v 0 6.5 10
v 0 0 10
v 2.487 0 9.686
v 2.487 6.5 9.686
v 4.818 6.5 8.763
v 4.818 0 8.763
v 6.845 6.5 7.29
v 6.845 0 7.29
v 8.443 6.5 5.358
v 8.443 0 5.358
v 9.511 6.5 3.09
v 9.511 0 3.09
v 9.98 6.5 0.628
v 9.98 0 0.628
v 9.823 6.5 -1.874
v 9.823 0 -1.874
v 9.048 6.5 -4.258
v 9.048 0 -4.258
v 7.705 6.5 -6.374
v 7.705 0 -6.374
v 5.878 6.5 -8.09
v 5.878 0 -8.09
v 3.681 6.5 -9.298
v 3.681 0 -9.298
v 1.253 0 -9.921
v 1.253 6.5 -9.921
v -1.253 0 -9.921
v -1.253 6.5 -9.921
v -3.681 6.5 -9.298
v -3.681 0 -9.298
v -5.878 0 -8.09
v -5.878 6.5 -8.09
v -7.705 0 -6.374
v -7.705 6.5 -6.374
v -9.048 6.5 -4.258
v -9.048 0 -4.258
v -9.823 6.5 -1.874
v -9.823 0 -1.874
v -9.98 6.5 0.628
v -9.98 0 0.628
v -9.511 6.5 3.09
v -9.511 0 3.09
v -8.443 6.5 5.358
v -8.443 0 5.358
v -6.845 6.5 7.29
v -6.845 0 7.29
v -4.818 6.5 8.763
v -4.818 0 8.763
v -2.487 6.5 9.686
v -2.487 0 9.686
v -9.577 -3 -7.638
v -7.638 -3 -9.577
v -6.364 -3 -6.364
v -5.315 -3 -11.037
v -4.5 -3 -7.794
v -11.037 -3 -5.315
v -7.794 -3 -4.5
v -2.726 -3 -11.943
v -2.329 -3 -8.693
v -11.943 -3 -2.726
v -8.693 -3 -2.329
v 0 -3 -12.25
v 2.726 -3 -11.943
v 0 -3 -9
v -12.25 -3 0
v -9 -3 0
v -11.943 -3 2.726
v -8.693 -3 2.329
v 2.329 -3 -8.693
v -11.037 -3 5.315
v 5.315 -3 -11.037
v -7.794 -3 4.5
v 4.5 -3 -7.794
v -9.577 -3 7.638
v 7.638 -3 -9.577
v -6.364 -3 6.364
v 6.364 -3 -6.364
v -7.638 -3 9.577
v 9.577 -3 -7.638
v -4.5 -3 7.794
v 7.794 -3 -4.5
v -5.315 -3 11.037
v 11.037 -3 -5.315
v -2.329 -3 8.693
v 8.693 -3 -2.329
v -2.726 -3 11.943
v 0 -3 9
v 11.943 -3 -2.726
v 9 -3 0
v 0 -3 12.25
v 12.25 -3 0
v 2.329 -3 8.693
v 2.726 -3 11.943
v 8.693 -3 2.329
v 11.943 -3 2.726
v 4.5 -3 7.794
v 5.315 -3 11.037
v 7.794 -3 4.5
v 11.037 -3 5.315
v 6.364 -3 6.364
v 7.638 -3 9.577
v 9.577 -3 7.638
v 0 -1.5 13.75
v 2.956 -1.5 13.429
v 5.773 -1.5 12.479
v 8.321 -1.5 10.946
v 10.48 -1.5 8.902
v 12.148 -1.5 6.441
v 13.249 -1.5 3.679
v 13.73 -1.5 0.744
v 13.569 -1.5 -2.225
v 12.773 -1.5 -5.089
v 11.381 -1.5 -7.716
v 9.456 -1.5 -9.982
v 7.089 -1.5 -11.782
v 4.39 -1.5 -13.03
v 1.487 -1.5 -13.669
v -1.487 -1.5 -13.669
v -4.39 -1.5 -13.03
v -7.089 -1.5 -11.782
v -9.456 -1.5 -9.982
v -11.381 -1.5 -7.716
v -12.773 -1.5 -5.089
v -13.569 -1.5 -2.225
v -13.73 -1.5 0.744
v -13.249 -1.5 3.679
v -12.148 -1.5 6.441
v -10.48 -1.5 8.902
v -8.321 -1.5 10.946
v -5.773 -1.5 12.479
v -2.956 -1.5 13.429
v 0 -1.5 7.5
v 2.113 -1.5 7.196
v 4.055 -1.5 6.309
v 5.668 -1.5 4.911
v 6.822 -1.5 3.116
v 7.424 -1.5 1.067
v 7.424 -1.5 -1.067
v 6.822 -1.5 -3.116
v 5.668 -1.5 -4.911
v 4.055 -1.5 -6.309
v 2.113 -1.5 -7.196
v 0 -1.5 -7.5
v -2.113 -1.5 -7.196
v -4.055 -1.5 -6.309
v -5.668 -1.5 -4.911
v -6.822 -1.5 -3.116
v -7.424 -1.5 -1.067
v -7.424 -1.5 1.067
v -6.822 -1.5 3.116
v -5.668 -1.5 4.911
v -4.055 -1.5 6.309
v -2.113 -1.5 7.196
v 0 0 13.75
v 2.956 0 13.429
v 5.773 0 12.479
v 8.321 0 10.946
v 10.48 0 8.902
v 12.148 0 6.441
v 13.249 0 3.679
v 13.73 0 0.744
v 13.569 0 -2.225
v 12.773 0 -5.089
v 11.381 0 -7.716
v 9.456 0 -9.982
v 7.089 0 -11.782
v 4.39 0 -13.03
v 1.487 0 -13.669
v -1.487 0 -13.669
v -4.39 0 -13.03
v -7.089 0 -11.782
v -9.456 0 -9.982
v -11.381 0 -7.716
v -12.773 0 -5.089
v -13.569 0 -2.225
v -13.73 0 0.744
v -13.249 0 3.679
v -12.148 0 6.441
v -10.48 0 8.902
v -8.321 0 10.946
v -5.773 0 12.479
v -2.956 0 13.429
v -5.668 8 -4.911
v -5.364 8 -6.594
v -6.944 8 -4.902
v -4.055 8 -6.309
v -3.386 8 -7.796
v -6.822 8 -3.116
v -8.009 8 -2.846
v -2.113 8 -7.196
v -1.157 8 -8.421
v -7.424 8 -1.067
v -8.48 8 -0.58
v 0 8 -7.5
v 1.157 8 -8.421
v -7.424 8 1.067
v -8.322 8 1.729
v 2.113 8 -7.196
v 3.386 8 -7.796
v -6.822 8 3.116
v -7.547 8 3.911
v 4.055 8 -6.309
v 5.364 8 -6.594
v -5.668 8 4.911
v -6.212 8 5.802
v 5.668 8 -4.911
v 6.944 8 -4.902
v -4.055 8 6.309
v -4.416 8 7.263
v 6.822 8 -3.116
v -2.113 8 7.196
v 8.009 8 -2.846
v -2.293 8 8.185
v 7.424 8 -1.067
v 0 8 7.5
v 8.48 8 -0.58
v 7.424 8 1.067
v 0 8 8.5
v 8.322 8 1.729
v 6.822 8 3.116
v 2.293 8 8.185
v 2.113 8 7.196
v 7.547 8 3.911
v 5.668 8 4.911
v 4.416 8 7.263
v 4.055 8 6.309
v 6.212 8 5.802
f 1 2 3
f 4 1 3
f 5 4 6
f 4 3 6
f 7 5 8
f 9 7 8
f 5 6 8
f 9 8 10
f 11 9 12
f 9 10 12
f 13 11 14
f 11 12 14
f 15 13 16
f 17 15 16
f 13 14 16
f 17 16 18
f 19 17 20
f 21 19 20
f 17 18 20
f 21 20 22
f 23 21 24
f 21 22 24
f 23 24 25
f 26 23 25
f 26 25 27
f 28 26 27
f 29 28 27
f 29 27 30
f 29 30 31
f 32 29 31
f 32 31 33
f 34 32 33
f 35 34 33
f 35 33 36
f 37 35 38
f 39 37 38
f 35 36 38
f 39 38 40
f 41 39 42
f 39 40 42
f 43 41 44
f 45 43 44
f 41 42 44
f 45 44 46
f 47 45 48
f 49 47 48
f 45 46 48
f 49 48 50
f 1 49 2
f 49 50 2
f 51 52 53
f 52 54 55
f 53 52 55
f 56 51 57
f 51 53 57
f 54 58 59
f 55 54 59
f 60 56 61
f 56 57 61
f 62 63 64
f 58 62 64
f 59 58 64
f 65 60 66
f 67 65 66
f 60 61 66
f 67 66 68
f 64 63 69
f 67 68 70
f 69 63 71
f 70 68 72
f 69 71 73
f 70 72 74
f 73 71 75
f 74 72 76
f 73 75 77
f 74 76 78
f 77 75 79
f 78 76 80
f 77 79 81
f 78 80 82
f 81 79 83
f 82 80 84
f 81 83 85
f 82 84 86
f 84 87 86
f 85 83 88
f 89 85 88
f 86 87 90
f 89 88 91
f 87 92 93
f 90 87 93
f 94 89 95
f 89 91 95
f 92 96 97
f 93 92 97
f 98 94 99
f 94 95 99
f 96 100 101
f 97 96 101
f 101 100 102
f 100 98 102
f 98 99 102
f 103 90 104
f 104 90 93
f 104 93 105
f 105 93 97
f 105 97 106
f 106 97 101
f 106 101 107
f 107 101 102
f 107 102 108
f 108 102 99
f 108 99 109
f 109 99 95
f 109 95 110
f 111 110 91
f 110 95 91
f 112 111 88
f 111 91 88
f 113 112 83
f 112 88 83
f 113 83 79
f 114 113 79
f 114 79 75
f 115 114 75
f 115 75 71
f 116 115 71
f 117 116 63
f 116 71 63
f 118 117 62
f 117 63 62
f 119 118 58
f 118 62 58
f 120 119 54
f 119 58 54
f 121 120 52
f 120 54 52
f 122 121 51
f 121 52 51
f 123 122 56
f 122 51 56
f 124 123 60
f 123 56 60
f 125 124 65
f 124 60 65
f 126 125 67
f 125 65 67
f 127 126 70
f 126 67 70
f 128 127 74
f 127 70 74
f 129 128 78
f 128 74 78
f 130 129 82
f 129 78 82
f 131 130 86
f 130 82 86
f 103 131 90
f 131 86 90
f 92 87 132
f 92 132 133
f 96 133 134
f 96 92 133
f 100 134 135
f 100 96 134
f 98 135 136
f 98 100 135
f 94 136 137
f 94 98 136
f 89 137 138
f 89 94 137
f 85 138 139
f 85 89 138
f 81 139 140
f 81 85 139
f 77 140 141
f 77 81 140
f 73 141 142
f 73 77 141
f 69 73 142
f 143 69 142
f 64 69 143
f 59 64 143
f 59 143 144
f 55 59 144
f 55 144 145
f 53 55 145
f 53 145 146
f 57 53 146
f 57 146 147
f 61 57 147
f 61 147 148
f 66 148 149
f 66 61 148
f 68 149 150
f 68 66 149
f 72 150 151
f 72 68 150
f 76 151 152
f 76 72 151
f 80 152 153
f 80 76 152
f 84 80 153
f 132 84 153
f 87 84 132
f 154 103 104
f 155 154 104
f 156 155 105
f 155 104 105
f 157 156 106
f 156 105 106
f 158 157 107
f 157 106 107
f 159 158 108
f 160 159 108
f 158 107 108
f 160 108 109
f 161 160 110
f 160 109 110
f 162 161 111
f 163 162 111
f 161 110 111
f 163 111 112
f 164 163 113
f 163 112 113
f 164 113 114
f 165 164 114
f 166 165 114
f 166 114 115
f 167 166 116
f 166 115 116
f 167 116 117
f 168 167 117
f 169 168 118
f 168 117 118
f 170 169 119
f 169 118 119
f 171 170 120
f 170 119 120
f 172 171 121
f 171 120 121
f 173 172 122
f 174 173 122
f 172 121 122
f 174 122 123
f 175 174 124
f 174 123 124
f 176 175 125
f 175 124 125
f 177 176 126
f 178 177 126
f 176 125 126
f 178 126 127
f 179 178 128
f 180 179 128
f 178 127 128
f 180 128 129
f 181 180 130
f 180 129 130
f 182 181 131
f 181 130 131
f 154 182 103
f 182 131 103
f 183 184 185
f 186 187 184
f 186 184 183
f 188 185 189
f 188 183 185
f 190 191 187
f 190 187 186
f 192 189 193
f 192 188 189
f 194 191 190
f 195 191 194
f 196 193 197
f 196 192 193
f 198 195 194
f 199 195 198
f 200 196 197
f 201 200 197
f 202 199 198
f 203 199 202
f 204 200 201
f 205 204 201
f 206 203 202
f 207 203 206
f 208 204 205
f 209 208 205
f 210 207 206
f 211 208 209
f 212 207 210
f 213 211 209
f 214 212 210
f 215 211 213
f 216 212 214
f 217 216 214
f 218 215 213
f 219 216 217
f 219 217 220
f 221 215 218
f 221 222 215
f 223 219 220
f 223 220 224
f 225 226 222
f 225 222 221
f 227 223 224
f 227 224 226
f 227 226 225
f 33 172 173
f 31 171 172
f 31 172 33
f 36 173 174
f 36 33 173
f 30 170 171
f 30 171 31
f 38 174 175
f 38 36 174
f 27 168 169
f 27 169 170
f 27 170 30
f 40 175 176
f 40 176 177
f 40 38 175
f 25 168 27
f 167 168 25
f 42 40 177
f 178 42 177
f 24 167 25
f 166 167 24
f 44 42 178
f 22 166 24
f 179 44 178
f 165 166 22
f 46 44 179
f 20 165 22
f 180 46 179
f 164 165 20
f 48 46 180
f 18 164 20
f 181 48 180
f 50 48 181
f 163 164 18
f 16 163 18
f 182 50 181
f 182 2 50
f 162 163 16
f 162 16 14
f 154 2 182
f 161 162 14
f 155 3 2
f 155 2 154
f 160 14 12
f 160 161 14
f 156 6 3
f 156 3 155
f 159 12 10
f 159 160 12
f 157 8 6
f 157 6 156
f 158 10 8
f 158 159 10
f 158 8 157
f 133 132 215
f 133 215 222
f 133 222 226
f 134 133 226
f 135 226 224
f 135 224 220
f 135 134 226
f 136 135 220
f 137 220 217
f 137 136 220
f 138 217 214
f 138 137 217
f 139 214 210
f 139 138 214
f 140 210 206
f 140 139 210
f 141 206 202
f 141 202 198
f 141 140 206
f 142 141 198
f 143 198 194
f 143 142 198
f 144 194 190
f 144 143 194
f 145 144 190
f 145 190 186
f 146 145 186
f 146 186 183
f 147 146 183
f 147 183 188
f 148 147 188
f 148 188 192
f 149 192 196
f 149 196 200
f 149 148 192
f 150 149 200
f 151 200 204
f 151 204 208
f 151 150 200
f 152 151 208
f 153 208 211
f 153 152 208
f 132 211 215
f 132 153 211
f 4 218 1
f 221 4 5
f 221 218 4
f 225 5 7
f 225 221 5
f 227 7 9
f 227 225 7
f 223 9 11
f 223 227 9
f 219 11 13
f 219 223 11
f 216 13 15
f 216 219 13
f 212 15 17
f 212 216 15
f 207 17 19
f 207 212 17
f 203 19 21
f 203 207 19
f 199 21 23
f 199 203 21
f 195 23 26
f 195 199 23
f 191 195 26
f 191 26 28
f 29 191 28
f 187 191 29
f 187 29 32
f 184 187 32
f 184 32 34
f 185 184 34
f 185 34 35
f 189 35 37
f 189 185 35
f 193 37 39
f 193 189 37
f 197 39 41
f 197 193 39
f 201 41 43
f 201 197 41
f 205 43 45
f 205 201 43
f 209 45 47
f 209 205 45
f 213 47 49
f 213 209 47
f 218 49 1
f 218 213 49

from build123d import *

# Parameters (mm, degrees)
SKETCH2_R           = 10
SKETCH2_R_2         = 7.5
BOSS_EXTRUDE1_DEPTH = 8
BOSS_EXTRUDE2_START = -3
SKETCH3_R           = 13.75
SKETCH3_R_2         = 10
SKETCH3_R_3         = 7.5
BOSS_EXTRUDE2_DEPTH = 3
CHAMFER1_SIZE       = 1.5


with BuildPart() as part:
    # Sketch2 → Boss-Extrude1 (new body)
    with BuildSketch(Plane(origin=(0, 0, 0), x_dir=(1, 0, 0), z_dir=(0, 1, 0))):
        with Locations(Location((0, 0, 0), (0, 0, 270))):
            Circle(SKETCH2_R)
        with Locations(Location((0, 0, 0), (0, 0, 270))):
            Circle(SKETCH2_R_2, mode=Mode.SUBTRACT)
    extrude(amount=BOSS_EXTRUDE1_DEPTH)

    # Sketch3 → Boss-Extrude2 (add)
    # profile 1 of 2: a face of its own
    with BuildSketch(Plane(origin=(0, 0, 0), x_dir=(1, 0, 0), z_dir=(0, 1, 0)).offset(BOSS_EXTRUDE2_START)):
        with Locations(Location((0, 0, 0), (0, 0, 270))):
            Circle(SKETCH3_R)
        with Locations(Location((0, 0, 0), (0, 0, 270))):
            Circle(SKETCH3_R_2, mode=Mode.SUBTRACT)
    # profile 2 of 2: a face of its own
    with BuildSketch(Plane(origin=(0, 0, 0), x_dir=(1, 0, 0), z_dir=(0, 1, 0)).offset(BOSS_EXTRUDE2_START)):
        with Locations(Location((0, 0, 0), (0, 0, 270))):
            Circle(SKETCH3_R_2)
        with Locations(Location((0, 0, 0), (0, 0, 270))):
            Circle(SKETCH3_R_3, mode=Mode.SUBTRACT)
    extrude(amount=BOSS_EXTRUDE2_DEPTH)

    # Chamfer1
    chamfer1_edges = [part.edges().sort_by_distance(p)[0] for p in [
        (0, -3, -13.75),
        (0, -3, -7.5),
        (0, 8, -10),
    ]]
    chamfer(chamfer1_edges, length=CHAMFER1_SIZE)


solid = part.part
